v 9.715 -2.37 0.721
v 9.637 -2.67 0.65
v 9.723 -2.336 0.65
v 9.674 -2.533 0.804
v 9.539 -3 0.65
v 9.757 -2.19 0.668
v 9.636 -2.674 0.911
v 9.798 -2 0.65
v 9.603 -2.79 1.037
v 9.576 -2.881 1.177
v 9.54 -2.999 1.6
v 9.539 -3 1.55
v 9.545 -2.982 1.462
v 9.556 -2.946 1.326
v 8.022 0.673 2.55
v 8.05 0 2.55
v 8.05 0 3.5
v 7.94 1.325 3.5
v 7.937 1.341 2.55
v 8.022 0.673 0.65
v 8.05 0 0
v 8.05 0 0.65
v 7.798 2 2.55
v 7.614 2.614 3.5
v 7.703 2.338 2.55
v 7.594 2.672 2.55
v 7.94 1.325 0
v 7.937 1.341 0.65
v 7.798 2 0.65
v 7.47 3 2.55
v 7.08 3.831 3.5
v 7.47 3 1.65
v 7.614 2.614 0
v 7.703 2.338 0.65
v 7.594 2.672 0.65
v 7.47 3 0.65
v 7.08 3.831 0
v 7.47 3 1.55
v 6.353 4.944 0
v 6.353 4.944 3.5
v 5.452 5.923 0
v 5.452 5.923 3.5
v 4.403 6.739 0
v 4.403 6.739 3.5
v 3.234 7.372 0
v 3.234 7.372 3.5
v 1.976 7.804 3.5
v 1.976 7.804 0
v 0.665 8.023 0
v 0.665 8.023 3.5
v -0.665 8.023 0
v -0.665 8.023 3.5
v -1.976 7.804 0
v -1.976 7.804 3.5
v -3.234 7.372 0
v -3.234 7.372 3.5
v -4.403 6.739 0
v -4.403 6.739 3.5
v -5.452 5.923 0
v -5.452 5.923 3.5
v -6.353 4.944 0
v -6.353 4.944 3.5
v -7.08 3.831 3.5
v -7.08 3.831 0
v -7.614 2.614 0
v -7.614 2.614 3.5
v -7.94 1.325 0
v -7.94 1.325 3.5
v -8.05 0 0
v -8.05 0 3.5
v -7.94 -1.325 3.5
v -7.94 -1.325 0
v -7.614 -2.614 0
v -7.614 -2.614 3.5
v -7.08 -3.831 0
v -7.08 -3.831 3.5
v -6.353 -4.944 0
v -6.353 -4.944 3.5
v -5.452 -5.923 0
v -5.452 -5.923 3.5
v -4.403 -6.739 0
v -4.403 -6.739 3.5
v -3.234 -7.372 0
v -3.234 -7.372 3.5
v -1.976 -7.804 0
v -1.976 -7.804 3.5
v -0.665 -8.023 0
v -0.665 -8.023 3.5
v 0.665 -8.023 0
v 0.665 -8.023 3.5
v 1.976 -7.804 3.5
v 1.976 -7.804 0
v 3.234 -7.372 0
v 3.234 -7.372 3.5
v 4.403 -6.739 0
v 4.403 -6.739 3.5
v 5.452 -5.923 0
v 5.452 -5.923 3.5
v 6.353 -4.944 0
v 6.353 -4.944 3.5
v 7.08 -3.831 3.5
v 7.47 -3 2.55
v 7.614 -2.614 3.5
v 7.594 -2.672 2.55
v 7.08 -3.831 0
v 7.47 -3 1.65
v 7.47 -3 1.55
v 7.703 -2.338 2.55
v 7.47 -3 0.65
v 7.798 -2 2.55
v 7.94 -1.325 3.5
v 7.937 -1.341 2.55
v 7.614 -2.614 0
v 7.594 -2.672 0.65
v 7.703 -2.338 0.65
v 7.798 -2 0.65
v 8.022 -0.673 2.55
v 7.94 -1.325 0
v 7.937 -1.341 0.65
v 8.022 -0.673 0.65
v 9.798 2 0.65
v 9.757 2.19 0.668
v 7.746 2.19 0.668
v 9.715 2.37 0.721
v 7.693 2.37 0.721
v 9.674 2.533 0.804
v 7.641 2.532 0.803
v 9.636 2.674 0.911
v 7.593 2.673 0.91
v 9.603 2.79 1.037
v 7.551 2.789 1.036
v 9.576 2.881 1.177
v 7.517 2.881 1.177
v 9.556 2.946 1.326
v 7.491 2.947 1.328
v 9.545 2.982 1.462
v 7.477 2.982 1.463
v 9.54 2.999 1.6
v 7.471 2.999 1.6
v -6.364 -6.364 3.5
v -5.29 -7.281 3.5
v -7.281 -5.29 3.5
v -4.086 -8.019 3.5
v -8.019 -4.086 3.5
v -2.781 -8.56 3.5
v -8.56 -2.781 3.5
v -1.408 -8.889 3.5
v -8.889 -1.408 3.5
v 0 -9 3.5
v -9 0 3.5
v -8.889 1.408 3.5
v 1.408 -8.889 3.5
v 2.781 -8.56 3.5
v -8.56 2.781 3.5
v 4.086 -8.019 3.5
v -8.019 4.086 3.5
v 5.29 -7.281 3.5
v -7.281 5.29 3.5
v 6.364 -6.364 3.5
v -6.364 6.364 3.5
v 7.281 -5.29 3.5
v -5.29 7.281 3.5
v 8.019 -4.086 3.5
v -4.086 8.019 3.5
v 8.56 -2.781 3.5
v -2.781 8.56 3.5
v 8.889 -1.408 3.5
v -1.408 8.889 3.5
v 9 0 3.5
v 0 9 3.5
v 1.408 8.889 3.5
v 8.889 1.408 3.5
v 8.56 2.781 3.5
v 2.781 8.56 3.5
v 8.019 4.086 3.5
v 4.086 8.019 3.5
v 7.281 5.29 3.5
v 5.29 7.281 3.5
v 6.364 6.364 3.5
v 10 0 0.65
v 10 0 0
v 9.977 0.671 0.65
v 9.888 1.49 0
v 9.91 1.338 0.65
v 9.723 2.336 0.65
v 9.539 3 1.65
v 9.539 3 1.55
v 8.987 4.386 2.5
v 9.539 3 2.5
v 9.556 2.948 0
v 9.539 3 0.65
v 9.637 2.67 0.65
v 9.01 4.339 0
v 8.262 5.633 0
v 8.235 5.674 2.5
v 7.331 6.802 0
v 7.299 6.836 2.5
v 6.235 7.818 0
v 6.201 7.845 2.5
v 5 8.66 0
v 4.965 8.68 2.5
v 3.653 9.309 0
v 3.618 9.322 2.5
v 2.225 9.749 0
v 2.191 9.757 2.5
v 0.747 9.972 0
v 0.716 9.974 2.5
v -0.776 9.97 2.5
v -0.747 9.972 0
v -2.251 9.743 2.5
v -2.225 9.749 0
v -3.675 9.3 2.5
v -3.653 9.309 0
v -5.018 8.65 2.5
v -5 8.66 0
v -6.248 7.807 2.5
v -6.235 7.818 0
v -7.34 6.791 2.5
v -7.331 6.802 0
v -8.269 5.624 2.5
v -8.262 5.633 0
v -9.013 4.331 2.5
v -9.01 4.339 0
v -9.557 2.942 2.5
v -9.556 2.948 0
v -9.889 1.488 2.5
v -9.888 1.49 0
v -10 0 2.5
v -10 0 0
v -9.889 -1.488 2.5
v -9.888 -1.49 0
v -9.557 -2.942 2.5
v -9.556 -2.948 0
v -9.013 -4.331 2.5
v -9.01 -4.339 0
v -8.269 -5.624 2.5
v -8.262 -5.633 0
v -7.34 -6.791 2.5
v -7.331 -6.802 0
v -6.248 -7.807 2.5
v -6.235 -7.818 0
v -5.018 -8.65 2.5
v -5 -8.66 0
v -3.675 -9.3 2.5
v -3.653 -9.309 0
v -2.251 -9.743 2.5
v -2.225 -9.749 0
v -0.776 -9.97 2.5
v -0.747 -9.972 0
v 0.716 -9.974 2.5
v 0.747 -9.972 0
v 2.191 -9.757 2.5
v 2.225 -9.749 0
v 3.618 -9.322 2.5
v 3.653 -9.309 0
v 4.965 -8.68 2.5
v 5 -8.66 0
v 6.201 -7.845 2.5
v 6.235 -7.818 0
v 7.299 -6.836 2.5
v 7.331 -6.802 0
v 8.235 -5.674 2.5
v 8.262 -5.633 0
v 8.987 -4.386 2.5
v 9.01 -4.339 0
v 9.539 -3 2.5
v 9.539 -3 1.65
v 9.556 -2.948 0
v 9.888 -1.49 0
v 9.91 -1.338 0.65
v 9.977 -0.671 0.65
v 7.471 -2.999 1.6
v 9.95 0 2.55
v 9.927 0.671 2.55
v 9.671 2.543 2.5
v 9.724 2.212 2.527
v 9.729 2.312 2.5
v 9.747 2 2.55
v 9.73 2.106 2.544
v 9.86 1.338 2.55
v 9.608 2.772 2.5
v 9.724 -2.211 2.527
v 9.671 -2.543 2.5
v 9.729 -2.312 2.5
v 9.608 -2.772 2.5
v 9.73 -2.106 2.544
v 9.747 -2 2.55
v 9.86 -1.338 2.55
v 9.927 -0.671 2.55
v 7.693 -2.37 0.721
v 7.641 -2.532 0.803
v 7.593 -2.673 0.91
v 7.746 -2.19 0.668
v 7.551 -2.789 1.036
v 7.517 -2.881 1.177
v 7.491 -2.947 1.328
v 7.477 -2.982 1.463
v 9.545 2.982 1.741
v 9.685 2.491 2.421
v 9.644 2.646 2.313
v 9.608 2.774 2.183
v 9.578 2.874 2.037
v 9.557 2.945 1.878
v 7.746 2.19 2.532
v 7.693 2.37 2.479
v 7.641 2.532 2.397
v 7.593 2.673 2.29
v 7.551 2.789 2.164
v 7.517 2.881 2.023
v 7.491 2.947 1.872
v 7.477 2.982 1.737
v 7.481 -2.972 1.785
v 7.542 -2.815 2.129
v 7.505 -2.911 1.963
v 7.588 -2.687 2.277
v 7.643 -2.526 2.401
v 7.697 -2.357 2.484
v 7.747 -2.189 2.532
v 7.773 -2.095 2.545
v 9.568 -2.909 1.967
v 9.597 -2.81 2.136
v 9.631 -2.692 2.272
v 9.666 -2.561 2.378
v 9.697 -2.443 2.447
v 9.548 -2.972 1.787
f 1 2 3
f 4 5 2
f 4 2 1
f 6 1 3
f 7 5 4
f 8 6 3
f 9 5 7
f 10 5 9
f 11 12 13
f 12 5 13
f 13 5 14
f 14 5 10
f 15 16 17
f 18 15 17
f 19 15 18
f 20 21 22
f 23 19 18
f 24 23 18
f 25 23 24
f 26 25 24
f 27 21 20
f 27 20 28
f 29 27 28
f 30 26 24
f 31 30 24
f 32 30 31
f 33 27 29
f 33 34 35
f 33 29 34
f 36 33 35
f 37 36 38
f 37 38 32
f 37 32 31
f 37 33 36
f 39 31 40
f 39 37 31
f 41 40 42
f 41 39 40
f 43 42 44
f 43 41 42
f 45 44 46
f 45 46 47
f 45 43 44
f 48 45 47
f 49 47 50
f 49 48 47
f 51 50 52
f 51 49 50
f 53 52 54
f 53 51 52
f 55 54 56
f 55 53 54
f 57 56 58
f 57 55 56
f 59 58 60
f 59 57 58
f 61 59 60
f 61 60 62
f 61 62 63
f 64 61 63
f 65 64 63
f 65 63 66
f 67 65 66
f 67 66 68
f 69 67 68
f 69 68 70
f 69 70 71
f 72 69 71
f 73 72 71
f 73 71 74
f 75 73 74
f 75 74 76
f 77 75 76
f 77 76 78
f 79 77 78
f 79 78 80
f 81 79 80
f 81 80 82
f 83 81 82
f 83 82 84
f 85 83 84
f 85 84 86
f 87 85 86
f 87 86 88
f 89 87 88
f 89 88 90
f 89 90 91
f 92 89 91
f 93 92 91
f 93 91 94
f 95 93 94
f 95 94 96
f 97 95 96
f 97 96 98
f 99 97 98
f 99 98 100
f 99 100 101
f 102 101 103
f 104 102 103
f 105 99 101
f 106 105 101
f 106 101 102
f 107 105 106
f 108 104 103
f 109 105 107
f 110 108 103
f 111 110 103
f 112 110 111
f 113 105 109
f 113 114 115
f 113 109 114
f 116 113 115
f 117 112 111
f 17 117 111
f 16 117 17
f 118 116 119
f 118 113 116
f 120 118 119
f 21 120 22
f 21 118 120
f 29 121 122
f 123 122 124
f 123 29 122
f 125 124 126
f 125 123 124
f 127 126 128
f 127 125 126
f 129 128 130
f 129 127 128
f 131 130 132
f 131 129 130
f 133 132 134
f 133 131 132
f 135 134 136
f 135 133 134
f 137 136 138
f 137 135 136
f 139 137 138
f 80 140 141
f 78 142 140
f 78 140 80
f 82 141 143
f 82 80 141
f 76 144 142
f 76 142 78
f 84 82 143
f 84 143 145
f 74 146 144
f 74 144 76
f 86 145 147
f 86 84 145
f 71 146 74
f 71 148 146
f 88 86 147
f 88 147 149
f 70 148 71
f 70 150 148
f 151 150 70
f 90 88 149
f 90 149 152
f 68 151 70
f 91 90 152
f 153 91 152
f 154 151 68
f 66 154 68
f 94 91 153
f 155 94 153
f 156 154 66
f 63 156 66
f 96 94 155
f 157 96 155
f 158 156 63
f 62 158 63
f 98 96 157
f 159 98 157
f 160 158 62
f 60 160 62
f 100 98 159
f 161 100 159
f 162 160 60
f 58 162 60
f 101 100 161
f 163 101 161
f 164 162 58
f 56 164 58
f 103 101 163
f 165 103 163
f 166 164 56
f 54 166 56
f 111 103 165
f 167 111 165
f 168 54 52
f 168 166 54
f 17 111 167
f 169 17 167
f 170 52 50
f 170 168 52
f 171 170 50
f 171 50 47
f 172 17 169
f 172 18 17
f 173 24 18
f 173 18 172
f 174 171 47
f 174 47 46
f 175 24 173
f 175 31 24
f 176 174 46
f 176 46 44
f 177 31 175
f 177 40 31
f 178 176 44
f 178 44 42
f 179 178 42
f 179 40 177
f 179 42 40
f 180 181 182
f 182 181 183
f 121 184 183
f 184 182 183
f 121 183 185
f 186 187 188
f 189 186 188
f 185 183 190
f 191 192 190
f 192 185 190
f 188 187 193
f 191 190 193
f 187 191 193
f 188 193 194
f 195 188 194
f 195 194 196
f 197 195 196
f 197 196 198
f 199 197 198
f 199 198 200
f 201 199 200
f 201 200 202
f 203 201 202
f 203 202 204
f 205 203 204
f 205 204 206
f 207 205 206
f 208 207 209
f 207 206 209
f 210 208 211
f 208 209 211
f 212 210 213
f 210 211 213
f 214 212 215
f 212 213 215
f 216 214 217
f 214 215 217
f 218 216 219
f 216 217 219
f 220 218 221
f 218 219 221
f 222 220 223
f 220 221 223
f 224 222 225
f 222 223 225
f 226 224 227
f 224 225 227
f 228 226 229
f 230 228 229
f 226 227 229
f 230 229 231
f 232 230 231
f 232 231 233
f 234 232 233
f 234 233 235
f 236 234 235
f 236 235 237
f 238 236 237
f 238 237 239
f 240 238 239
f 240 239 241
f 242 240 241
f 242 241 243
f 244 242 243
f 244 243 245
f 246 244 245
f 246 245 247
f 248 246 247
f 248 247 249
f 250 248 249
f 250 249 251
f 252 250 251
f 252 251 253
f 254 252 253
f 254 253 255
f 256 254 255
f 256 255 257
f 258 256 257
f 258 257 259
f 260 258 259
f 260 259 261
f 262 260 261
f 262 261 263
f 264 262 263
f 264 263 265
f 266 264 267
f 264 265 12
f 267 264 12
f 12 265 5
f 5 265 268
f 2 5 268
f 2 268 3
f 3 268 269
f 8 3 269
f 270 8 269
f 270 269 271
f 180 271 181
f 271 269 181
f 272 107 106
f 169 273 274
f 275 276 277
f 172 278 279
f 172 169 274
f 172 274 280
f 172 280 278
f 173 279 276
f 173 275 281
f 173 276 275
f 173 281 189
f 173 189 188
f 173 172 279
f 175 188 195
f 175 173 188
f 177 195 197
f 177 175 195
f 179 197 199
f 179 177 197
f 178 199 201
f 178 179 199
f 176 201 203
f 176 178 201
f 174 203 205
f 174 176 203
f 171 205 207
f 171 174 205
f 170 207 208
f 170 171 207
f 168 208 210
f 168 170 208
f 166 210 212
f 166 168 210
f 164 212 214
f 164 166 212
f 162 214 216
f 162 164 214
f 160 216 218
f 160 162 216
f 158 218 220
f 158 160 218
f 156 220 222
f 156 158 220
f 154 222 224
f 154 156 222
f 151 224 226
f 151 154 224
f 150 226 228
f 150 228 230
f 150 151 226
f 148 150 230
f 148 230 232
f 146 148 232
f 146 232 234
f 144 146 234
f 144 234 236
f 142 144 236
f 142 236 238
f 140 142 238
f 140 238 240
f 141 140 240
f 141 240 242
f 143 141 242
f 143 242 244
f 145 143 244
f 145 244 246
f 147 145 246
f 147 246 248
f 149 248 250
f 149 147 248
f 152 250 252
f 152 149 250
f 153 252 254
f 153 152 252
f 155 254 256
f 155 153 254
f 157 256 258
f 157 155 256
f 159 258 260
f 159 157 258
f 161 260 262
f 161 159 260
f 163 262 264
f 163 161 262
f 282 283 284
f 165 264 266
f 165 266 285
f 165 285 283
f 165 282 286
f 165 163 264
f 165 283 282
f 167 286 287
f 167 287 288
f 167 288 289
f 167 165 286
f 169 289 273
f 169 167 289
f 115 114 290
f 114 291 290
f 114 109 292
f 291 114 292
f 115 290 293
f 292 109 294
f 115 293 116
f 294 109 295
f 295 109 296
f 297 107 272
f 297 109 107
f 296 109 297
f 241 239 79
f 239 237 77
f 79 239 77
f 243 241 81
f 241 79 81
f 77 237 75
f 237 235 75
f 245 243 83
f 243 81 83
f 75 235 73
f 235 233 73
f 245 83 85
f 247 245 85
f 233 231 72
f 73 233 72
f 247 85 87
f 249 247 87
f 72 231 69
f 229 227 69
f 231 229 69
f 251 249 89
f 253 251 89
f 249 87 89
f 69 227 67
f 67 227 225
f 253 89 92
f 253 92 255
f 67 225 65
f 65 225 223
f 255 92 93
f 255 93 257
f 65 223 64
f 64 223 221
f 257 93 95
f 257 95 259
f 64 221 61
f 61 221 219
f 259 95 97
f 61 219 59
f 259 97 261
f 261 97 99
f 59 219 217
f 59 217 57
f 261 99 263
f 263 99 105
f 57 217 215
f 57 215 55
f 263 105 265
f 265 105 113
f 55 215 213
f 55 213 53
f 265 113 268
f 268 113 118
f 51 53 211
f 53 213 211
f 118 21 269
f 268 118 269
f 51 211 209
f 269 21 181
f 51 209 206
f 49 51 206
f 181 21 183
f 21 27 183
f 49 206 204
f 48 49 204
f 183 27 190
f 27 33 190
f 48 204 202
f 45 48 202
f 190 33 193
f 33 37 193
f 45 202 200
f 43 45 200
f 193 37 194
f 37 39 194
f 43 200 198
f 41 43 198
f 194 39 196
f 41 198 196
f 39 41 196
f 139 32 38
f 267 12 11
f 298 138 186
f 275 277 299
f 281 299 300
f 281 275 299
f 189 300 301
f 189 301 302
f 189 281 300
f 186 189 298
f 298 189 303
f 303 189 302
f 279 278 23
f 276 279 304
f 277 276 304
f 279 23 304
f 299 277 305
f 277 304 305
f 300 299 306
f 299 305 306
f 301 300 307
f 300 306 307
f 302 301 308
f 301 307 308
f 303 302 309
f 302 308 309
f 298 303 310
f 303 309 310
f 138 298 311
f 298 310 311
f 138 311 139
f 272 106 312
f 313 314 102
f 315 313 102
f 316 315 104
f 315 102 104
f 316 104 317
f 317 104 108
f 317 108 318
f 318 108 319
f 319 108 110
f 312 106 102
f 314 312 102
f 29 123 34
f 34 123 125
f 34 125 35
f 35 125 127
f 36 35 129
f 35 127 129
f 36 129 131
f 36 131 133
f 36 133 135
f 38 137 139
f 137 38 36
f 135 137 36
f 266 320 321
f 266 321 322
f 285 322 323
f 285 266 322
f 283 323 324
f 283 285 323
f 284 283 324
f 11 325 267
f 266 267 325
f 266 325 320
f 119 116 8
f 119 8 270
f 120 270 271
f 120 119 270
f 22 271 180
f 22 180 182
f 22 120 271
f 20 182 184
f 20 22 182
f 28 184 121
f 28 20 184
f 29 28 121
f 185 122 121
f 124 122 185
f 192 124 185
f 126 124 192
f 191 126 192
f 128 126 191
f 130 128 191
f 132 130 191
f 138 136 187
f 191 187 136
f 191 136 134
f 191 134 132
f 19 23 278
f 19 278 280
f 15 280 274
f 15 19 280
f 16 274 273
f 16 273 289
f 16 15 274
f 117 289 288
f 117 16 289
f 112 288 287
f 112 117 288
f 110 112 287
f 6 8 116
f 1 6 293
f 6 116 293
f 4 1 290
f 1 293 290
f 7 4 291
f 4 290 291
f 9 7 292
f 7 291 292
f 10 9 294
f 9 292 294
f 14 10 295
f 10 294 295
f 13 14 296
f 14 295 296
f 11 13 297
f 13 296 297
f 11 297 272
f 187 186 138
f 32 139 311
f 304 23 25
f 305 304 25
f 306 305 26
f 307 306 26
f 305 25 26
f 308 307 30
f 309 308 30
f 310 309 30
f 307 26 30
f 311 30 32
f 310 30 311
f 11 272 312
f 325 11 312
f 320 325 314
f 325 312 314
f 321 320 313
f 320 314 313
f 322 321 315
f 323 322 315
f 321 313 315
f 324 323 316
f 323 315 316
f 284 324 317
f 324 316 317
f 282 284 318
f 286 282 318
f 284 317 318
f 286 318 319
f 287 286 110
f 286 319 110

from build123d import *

# Parameters (mm, degrees)
F0_R         = 10
F0_R_2       = 8.05
F1_DEPTH     = 3.5
F3_DEPTH     = 16.9
F4_T4_DEPTH  = 7.0692849199
F4_S5_R      = 10
F4_T6_DEPTH  = 5
F4_S7_R      = 8.05
F4_T8_DEPTH  = 5
F4_T12_DEPTH = 7.0692849199
F4_S13_R     = 10
F4_T14_DEPTH = 5
F4_S15_R     = 8.05
F4_T16_DEPTH = 5
F4_T20_DEPTH = 7.0692849199
F4_S21_R     = 10
F4_T22_DEPTH = 5
F4_S23_R     = 8.05
F4_T24_DEPTH = 5
F4_T28_DEPTH = 7.0692849199
F4_S29_R     = 10
F4_T30_DEPTH = 5
F4_S31_R     = 8.05
F4_T32_DEPTH = 5


# Not quite as in the source:
# - a fillet or chamfer that OpenCascade refuses, or shapes differently, is made with other operations: its cross-section is extruded or revolved along the edge and cut away or added


with BuildPart() as f1:
    # F0 (on Top) → F1 (new body)
    with BuildSketch(Plane.XY):
        Circle(F0_R)
        Circle(F0_R_2, mode=Mode.SUBTRACT)
    extrude(amount=F1_DEPTH)

    # F2 (on Right) → F3 (cut)
    with BuildSketch(Plane.YZ):
        Polygon((3, 0.65), (3, 2.55), (-3, 2.55), (-3, 0.65), (0, 0.65), align=None)
    extrude(amount=F3_DEPTH, mode=Mode.SUBTRACT)

    # F4: fillet of radius 1 on 4 edges, made by hand


with BuildPart() as f4_tool2:
    # F4_s3 → F4_t4 (new body)
    with BuildSketch(Plane.YZ.offset(4.9701070943)):
        with BuildLine():
            ThreePointArc((2, 2.55), (2.7071067812, 2.2571067812), (3, 1.55))
            Line((3, 1.55), (3, 2.55))
            Line((3, 2.55), (2, 2.55))
        make_face()
    extrude(amount=F4_T4_DEPTH)

    # F4_s5 → F4_t6 (intersect, symmetric)
    with BuildSketch(Plane.XY.offset(2)):
        Circle(F4_S5_R)
    extrude(amount=F4_T6_DEPTH, both=True, mode=Mode.INTERSECT)

    # F4_s7 → F4_t8 (cut, symmetric)
    with BuildSketch(Plane.XY.offset(2)):
        Circle(F4_S7_R)
    extrude(amount=F4_T8_DEPTH, both=True, mode=Mode.SUBTRACT)


with BuildPart() as f1_1:
    add(f1.part)

    # F4_t1: union F4_tool2
    add(f4_tool2.part)


with BuildPart() as f4_tool10:
    # F4_s11 → F4_t12 (new body)
    with BuildSketch(Plane.YZ.offset(4.9701070943)):
        with BuildLine():
            ThreePointArc((2, 0.65), (2.7071067812, 0.9428932188), (3, 1.65))
            Line((3, 1.65), (3, 0.65))
            Line((3, 0.65), (2, 0.65))
        make_face()
    extrude(amount=F4_T12_DEPTH)

    # F4_s13 → F4_t14 (intersect, symmetric)
    with BuildSketch(Plane.XY.offset(1.1)):
        Circle(F4_S13_R)
    extrude(amount=F4_T14_DEPTH, both=True, mode=Mode.INTERSECT)

    # F4_s15 → F4_t16 (cut, symmetric)
    with BuildSketch(Plane.XY.offset(1.1)):
        Circle(F4_S15_R)
    extrude(amount=F4_T16_DEPTH, both=True, mode=Mode.SUBTRACT)


with BuildPart() as f1_2:
    add(f1_1.part)

    # F4_t9: union F4_tool10
    add(f4_tool10.part)


with BuildPart() as f4_tool18:
    # F4_s19 → F4_t20 (new body)
    with BuildSketch(Plane.YZ.offset(4.9701070943)):
        with BuildLine():
            ThreePointArc((-3, 1.55), (-2.7071067812, 2.2571067812), (-2, 2.55))
            Line((-2, 2.55), (-3, 2.55))
            Line((-3, 2.55), (-3, 1.55))
        make_face()
    extrude(amount=F4_T20_DEPTH)

    # F4_s21 → F4_t22 (intersect, symmetric)
    with BuildSketch(Plane.XY.offset(2)):
        Circle(F4_S21_R)
    extrude(amount=F4_T22_DEPTH, both=True, mode=Mode.INTERSECT)

    # F4_s23 → F4_t24 (cut, symmetric)
    with BuildSketch(Plane.XY.offset(2)):
        Circle(F4_S23_R)
    extrude(amount=F4_T24_DEPTH, both=True, mode=Mode.SUBTRACT)


with BuildPart() as f1_3:
    add(f1_2.part)

    # F4_t17: union F4_tool18
    add(f4_tool18.part)


with BuildPart() as f4_tool26:
    # F4_s27 → F4_t28 (new body)
    with BuildSketch(Plane.YZ.offset(4.9701070943)):
        with BuildLine():
            ThreePointArc((-2, 0.65), (-2.7071067812, 0.9428932188), (-3, 1.65))
            Line((-3, 1.65), (-3, 0.65))
            Line((-3, 0.65), (-2, 0.65))
        make_face()
    extrude(amount=F4_T28_DEPTH)

    # F4_s29 → F4_t30 (intersect, symmetric)
    with BuildSketch(Plane.XY.offset(1.1)):
        Circle(F4_S29_R)
    extrude(amount=F4_T30_DEPTH, both=True, mode=Mode.INTERSECT)

    # F4_s31 → F4_t32 (cut, symmetric)
    with BuildSketch(Plane.XY.offset(1.1)):
        Circle(F4_S31_R)
    extrude(amount=F4_T32_DEPTH, both=True, mode=Mode.SUBTRACT)


with BuildPart() as f1_4:
    add(f1_3.part)

    # F4_t25: union F4_tool26
    add(f4_tool26.part)

    # F5: chamfer of 1 on 1 edges, made by hand

    # F5_s1 → F5_t2 (revolve, cut)
    with BuildSketch(Plane.XZ):
        Polygon((10, 2.5), (9, 3.5), (10, 3.5), align=None)
    revolve(axis=Axis((0, 0, 3.5), (0, 0, 1)), mode=Mode.SUBTRACT)


solid = f1_4.part
